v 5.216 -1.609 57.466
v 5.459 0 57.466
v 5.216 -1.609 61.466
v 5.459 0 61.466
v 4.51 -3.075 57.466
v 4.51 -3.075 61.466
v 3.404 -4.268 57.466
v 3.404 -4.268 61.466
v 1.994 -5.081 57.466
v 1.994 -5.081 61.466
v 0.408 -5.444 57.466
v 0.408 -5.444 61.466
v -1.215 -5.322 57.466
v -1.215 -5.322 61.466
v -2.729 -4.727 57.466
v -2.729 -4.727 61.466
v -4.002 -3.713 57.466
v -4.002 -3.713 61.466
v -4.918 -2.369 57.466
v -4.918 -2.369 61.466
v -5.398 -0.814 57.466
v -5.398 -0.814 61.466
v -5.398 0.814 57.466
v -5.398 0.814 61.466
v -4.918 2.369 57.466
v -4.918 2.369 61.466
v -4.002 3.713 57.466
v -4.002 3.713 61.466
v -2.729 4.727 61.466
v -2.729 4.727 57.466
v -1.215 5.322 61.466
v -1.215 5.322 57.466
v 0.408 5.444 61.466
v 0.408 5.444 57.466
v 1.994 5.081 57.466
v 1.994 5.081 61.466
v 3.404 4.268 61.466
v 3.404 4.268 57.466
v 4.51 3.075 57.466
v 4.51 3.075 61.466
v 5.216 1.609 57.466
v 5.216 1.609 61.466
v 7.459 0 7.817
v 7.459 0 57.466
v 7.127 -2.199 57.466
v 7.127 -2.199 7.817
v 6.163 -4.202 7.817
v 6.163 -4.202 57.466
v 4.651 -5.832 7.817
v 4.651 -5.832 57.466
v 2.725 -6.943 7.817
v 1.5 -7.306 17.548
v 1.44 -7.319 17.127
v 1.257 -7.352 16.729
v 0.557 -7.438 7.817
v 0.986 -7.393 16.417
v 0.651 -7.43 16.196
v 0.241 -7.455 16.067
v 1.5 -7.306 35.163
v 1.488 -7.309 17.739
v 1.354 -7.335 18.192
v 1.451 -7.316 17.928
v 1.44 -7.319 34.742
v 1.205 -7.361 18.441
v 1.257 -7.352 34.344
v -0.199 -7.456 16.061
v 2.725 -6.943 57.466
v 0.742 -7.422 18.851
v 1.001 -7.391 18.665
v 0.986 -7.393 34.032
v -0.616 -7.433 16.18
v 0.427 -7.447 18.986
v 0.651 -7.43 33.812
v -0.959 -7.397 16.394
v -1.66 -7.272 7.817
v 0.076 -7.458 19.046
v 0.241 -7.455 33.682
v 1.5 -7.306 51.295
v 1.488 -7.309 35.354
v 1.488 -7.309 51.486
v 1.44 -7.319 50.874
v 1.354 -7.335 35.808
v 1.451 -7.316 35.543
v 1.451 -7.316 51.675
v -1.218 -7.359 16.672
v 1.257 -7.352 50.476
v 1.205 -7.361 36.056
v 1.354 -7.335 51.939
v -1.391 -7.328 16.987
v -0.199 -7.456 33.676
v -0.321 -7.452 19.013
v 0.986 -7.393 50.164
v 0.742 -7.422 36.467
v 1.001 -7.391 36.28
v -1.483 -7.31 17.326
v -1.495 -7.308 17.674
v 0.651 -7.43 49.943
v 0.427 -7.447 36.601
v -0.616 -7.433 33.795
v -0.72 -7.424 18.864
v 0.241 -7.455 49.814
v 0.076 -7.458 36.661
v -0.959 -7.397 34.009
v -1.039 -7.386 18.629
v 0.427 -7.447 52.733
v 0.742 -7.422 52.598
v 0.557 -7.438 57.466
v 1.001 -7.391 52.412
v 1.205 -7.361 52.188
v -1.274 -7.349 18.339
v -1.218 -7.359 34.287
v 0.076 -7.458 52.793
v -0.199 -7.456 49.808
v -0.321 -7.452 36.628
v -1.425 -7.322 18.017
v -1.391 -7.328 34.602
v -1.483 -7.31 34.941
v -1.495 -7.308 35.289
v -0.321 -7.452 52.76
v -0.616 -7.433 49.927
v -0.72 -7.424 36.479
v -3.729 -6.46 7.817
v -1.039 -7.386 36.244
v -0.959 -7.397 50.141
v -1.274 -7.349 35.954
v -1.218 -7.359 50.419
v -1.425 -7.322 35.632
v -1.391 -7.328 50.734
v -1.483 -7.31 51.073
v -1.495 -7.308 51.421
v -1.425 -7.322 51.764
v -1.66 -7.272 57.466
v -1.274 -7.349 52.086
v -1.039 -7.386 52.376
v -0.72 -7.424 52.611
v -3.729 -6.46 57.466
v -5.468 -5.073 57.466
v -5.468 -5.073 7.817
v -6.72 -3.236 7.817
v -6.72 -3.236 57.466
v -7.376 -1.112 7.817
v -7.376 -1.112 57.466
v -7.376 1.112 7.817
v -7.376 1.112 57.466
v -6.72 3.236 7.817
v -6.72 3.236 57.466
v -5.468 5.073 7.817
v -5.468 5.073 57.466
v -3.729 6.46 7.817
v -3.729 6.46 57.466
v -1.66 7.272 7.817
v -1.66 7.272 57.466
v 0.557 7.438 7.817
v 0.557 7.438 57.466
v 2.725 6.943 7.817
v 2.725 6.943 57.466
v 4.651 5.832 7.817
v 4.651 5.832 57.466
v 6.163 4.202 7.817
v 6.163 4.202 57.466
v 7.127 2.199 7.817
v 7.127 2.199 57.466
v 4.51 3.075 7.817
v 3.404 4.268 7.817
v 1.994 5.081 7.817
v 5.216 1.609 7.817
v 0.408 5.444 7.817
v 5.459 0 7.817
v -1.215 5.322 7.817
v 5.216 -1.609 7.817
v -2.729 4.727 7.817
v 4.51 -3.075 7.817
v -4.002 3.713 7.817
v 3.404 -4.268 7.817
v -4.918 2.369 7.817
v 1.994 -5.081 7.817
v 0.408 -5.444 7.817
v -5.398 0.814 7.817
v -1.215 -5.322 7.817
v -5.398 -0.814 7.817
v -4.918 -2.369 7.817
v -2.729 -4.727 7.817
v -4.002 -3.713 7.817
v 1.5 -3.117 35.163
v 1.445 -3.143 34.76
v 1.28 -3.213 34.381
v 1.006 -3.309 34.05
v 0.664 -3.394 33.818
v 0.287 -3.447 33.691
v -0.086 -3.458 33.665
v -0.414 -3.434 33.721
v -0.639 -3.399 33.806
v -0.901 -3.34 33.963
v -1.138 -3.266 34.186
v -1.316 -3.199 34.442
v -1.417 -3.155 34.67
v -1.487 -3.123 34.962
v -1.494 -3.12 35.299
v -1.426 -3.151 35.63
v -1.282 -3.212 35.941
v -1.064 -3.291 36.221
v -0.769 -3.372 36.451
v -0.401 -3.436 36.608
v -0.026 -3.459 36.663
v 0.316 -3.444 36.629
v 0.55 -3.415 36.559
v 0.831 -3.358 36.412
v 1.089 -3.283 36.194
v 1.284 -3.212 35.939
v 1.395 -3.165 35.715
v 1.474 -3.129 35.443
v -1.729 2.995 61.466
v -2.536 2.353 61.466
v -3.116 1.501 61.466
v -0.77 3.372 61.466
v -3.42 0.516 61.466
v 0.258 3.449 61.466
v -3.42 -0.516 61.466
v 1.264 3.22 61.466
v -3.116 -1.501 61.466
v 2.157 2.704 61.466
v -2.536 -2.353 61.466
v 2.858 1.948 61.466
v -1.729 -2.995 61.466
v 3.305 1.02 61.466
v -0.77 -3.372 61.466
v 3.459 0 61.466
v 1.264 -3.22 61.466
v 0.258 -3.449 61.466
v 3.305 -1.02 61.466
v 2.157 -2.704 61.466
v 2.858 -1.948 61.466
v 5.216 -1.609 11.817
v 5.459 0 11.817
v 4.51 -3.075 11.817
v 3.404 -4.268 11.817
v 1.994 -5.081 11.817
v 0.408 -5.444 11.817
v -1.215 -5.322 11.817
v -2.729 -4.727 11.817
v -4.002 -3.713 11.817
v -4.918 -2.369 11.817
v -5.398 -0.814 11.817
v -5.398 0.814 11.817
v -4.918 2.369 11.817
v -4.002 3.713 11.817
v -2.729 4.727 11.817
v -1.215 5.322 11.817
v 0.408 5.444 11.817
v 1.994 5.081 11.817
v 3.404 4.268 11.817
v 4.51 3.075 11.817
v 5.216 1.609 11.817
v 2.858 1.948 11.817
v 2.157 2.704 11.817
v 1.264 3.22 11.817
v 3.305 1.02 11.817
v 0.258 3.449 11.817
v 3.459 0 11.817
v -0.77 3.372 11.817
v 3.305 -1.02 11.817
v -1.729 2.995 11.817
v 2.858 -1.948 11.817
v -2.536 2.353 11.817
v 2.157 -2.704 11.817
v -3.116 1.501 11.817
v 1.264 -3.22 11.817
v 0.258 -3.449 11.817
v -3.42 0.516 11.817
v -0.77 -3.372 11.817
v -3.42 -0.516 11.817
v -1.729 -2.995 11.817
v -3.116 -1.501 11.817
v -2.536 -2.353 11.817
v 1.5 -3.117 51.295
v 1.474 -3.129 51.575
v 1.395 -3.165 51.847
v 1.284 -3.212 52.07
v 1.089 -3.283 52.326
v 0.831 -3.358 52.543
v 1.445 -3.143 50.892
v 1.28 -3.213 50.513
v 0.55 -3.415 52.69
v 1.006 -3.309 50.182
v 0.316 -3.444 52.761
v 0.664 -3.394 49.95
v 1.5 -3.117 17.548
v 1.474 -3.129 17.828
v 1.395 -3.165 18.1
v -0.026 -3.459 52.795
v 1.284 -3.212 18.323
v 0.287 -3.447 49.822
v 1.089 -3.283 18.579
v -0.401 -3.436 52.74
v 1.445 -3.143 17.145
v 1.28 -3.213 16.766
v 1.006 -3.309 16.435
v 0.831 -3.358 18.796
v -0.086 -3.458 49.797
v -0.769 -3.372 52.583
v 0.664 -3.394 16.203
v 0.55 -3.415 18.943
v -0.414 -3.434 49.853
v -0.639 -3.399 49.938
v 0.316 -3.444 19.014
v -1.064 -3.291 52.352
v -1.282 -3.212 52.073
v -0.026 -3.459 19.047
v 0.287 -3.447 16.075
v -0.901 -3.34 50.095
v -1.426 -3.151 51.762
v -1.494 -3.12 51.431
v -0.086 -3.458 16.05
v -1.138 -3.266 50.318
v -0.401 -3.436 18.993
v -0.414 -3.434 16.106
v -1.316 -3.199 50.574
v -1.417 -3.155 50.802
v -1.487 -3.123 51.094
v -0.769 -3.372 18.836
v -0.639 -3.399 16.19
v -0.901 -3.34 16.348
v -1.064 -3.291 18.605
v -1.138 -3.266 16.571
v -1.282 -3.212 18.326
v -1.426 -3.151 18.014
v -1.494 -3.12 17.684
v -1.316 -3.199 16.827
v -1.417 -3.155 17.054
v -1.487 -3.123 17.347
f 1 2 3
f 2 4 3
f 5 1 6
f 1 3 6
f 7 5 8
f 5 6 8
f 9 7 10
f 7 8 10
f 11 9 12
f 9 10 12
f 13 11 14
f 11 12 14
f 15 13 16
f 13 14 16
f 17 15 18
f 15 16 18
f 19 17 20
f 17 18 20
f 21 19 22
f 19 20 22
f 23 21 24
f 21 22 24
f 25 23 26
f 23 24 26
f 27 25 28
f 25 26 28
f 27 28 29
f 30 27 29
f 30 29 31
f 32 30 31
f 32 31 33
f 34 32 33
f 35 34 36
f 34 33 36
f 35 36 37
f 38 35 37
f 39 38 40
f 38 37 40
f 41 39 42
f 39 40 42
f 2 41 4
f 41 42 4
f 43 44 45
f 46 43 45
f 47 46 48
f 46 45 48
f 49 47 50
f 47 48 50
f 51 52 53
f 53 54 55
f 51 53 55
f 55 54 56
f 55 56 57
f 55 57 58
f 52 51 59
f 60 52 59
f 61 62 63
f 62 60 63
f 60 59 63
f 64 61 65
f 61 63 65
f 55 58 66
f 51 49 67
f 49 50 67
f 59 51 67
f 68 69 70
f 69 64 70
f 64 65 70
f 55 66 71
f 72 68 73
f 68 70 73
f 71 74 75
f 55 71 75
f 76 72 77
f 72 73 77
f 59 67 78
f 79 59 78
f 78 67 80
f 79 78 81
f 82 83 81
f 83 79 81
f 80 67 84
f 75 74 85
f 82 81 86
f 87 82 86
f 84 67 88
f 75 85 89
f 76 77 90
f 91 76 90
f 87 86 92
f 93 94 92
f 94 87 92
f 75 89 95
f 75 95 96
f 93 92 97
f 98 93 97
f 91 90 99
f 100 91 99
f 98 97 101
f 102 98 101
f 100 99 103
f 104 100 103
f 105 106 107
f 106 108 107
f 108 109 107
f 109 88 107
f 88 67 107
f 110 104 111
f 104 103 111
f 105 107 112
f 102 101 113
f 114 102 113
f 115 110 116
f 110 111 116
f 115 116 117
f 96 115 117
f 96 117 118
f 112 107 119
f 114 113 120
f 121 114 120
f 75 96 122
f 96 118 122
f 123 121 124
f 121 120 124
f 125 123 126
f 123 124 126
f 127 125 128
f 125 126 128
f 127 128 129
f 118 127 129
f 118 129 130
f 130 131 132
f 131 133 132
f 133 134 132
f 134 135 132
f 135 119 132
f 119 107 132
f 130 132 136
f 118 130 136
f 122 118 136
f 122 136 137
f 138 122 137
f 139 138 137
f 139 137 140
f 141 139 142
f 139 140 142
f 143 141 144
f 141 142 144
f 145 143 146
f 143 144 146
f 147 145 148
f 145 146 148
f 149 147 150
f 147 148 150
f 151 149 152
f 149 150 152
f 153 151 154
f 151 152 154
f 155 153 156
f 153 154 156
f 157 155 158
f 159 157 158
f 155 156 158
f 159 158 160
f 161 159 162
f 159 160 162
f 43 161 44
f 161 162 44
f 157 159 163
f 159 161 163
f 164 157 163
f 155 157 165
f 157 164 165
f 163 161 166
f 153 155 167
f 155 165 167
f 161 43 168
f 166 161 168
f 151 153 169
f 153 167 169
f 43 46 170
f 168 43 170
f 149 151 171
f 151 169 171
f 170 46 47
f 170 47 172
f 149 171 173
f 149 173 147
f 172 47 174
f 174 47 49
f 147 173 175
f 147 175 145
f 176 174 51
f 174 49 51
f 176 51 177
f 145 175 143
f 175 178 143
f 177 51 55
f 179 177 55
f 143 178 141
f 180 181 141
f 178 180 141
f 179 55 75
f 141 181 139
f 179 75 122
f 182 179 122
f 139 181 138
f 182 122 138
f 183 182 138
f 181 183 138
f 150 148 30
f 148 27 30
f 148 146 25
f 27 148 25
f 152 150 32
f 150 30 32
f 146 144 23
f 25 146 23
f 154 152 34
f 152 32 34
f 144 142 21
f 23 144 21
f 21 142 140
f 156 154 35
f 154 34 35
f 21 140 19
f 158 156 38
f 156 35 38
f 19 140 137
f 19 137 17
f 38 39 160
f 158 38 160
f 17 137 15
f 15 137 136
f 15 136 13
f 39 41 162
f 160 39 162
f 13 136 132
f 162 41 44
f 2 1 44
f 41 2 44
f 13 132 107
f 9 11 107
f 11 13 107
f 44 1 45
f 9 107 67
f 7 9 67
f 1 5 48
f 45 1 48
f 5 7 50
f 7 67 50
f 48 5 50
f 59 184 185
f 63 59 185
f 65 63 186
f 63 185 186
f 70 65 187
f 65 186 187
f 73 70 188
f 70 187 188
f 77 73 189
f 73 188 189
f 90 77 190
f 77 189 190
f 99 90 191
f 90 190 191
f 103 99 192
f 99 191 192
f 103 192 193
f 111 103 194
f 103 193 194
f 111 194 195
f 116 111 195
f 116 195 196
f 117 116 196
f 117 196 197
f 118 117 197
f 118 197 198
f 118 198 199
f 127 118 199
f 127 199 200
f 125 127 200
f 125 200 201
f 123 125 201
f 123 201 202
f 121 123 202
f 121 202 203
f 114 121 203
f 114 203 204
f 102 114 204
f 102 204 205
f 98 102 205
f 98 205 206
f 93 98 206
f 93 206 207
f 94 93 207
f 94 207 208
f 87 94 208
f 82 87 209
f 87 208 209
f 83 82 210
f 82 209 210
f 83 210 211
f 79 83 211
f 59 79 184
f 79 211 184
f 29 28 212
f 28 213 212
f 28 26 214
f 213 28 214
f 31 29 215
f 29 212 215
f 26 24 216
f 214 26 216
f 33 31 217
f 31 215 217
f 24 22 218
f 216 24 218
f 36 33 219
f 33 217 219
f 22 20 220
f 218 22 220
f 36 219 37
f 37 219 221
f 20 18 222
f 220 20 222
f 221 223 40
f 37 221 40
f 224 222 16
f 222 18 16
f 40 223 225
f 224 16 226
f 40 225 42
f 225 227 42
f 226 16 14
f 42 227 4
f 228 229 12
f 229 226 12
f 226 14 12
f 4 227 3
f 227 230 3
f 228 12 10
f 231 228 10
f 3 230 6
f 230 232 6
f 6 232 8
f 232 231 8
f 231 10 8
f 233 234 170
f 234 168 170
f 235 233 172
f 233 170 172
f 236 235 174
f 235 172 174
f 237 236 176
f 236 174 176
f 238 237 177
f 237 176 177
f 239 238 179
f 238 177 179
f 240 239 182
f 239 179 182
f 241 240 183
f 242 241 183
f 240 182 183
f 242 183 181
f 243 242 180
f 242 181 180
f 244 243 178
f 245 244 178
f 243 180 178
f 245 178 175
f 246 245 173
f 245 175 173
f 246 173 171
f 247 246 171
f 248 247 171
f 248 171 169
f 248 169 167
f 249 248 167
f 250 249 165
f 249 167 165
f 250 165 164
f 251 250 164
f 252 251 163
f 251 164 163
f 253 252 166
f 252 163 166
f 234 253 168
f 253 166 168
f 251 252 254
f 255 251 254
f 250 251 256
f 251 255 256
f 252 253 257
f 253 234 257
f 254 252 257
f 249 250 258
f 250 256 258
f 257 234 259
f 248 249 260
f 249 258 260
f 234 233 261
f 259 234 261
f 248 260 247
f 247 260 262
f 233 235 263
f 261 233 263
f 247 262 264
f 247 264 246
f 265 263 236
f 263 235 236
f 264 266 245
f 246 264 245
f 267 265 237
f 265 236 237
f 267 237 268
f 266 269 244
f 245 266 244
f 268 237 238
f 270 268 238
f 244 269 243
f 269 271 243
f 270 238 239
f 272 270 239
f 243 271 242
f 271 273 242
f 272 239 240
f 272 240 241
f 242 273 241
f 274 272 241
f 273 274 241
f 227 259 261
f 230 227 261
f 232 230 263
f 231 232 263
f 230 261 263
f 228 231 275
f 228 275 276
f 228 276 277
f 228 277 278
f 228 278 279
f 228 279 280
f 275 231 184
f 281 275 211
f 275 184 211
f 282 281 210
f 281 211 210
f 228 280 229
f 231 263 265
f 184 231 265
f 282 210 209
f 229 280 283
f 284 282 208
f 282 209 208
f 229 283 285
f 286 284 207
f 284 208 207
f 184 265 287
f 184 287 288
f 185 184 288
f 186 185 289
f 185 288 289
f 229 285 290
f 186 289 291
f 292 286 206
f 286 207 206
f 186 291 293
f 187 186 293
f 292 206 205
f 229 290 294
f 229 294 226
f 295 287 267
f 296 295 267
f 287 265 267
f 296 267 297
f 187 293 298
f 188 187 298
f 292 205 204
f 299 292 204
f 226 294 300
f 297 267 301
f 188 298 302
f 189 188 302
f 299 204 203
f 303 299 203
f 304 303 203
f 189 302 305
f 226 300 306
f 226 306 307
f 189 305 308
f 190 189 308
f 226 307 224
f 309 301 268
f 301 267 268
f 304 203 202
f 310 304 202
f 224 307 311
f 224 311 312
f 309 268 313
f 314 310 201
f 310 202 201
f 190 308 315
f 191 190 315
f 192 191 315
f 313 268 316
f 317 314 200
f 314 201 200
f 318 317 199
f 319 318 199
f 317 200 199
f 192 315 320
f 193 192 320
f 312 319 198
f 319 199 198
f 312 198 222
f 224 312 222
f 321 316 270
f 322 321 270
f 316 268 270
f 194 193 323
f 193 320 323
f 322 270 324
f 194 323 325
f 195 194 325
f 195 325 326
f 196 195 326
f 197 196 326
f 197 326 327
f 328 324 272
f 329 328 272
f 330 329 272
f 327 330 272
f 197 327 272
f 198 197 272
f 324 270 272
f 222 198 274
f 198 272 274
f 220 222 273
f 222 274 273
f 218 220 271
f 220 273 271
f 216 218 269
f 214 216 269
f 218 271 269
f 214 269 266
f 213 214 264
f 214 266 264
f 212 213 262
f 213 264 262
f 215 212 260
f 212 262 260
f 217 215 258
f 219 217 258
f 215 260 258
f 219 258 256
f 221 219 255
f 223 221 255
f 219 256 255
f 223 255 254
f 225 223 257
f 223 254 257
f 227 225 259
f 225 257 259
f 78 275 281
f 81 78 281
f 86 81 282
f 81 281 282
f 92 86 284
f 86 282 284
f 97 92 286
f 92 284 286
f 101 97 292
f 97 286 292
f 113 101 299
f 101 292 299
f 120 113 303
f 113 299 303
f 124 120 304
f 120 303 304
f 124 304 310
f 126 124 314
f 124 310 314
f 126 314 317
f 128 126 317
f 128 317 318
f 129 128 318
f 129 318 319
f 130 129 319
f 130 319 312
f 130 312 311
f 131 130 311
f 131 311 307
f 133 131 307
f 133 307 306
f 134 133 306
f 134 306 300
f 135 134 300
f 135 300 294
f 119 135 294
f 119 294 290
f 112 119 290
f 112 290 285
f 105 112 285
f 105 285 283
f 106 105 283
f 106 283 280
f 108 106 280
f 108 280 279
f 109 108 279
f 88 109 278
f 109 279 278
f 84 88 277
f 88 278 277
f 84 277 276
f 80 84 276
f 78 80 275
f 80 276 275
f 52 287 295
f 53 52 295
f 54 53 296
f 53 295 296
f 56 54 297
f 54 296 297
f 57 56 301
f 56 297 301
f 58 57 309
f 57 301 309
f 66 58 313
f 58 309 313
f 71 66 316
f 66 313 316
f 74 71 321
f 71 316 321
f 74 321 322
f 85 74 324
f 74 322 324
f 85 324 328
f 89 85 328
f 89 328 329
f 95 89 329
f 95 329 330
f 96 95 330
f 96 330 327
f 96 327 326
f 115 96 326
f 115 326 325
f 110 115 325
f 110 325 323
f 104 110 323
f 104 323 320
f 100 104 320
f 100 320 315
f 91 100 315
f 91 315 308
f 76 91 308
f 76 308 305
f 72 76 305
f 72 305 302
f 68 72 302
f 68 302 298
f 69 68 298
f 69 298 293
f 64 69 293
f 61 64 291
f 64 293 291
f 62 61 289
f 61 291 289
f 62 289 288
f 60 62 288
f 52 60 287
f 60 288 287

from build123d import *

# Parameters (mm, degrees)
F3_D     = 3
F3_DEPTH = 7.4598419297


with BuildPart() as f1:
    # F0 (on Front) → F1 (revolve)
    with BuildSketch(Plane.XZ):
        Polygon((3.4588419297, 61.4661982319), (3.4588419297, 11.8165865856), (5.4588419297, 11.8165865856), (5.4588419297, 7.8165865856), (7.4588419297, 7.8165865856), (7.4588419297, 57.4661982319), (5.4588419297, 57.4661982319), (5.4588419297, 61.4661982319), align=None)
    revolve(axis=Axis((0, 0, 33.0960974097), (0, 0, -1)))

    # F3 (through all, one way)
    with BuildSketch(Plane(origin=(0, 0, 0), x_dir=(1, 0, 0), z_dir=(0, 1, 0))):
        with Locations((0, -51.2947626412), (0, -35.1628810167), (0, -17.5476111472)):
            Circle(F3_D / 2)
    extrude(amount=-F3_DEPTH, mode=Mode.SUBTRACT)


solid = f1.part
